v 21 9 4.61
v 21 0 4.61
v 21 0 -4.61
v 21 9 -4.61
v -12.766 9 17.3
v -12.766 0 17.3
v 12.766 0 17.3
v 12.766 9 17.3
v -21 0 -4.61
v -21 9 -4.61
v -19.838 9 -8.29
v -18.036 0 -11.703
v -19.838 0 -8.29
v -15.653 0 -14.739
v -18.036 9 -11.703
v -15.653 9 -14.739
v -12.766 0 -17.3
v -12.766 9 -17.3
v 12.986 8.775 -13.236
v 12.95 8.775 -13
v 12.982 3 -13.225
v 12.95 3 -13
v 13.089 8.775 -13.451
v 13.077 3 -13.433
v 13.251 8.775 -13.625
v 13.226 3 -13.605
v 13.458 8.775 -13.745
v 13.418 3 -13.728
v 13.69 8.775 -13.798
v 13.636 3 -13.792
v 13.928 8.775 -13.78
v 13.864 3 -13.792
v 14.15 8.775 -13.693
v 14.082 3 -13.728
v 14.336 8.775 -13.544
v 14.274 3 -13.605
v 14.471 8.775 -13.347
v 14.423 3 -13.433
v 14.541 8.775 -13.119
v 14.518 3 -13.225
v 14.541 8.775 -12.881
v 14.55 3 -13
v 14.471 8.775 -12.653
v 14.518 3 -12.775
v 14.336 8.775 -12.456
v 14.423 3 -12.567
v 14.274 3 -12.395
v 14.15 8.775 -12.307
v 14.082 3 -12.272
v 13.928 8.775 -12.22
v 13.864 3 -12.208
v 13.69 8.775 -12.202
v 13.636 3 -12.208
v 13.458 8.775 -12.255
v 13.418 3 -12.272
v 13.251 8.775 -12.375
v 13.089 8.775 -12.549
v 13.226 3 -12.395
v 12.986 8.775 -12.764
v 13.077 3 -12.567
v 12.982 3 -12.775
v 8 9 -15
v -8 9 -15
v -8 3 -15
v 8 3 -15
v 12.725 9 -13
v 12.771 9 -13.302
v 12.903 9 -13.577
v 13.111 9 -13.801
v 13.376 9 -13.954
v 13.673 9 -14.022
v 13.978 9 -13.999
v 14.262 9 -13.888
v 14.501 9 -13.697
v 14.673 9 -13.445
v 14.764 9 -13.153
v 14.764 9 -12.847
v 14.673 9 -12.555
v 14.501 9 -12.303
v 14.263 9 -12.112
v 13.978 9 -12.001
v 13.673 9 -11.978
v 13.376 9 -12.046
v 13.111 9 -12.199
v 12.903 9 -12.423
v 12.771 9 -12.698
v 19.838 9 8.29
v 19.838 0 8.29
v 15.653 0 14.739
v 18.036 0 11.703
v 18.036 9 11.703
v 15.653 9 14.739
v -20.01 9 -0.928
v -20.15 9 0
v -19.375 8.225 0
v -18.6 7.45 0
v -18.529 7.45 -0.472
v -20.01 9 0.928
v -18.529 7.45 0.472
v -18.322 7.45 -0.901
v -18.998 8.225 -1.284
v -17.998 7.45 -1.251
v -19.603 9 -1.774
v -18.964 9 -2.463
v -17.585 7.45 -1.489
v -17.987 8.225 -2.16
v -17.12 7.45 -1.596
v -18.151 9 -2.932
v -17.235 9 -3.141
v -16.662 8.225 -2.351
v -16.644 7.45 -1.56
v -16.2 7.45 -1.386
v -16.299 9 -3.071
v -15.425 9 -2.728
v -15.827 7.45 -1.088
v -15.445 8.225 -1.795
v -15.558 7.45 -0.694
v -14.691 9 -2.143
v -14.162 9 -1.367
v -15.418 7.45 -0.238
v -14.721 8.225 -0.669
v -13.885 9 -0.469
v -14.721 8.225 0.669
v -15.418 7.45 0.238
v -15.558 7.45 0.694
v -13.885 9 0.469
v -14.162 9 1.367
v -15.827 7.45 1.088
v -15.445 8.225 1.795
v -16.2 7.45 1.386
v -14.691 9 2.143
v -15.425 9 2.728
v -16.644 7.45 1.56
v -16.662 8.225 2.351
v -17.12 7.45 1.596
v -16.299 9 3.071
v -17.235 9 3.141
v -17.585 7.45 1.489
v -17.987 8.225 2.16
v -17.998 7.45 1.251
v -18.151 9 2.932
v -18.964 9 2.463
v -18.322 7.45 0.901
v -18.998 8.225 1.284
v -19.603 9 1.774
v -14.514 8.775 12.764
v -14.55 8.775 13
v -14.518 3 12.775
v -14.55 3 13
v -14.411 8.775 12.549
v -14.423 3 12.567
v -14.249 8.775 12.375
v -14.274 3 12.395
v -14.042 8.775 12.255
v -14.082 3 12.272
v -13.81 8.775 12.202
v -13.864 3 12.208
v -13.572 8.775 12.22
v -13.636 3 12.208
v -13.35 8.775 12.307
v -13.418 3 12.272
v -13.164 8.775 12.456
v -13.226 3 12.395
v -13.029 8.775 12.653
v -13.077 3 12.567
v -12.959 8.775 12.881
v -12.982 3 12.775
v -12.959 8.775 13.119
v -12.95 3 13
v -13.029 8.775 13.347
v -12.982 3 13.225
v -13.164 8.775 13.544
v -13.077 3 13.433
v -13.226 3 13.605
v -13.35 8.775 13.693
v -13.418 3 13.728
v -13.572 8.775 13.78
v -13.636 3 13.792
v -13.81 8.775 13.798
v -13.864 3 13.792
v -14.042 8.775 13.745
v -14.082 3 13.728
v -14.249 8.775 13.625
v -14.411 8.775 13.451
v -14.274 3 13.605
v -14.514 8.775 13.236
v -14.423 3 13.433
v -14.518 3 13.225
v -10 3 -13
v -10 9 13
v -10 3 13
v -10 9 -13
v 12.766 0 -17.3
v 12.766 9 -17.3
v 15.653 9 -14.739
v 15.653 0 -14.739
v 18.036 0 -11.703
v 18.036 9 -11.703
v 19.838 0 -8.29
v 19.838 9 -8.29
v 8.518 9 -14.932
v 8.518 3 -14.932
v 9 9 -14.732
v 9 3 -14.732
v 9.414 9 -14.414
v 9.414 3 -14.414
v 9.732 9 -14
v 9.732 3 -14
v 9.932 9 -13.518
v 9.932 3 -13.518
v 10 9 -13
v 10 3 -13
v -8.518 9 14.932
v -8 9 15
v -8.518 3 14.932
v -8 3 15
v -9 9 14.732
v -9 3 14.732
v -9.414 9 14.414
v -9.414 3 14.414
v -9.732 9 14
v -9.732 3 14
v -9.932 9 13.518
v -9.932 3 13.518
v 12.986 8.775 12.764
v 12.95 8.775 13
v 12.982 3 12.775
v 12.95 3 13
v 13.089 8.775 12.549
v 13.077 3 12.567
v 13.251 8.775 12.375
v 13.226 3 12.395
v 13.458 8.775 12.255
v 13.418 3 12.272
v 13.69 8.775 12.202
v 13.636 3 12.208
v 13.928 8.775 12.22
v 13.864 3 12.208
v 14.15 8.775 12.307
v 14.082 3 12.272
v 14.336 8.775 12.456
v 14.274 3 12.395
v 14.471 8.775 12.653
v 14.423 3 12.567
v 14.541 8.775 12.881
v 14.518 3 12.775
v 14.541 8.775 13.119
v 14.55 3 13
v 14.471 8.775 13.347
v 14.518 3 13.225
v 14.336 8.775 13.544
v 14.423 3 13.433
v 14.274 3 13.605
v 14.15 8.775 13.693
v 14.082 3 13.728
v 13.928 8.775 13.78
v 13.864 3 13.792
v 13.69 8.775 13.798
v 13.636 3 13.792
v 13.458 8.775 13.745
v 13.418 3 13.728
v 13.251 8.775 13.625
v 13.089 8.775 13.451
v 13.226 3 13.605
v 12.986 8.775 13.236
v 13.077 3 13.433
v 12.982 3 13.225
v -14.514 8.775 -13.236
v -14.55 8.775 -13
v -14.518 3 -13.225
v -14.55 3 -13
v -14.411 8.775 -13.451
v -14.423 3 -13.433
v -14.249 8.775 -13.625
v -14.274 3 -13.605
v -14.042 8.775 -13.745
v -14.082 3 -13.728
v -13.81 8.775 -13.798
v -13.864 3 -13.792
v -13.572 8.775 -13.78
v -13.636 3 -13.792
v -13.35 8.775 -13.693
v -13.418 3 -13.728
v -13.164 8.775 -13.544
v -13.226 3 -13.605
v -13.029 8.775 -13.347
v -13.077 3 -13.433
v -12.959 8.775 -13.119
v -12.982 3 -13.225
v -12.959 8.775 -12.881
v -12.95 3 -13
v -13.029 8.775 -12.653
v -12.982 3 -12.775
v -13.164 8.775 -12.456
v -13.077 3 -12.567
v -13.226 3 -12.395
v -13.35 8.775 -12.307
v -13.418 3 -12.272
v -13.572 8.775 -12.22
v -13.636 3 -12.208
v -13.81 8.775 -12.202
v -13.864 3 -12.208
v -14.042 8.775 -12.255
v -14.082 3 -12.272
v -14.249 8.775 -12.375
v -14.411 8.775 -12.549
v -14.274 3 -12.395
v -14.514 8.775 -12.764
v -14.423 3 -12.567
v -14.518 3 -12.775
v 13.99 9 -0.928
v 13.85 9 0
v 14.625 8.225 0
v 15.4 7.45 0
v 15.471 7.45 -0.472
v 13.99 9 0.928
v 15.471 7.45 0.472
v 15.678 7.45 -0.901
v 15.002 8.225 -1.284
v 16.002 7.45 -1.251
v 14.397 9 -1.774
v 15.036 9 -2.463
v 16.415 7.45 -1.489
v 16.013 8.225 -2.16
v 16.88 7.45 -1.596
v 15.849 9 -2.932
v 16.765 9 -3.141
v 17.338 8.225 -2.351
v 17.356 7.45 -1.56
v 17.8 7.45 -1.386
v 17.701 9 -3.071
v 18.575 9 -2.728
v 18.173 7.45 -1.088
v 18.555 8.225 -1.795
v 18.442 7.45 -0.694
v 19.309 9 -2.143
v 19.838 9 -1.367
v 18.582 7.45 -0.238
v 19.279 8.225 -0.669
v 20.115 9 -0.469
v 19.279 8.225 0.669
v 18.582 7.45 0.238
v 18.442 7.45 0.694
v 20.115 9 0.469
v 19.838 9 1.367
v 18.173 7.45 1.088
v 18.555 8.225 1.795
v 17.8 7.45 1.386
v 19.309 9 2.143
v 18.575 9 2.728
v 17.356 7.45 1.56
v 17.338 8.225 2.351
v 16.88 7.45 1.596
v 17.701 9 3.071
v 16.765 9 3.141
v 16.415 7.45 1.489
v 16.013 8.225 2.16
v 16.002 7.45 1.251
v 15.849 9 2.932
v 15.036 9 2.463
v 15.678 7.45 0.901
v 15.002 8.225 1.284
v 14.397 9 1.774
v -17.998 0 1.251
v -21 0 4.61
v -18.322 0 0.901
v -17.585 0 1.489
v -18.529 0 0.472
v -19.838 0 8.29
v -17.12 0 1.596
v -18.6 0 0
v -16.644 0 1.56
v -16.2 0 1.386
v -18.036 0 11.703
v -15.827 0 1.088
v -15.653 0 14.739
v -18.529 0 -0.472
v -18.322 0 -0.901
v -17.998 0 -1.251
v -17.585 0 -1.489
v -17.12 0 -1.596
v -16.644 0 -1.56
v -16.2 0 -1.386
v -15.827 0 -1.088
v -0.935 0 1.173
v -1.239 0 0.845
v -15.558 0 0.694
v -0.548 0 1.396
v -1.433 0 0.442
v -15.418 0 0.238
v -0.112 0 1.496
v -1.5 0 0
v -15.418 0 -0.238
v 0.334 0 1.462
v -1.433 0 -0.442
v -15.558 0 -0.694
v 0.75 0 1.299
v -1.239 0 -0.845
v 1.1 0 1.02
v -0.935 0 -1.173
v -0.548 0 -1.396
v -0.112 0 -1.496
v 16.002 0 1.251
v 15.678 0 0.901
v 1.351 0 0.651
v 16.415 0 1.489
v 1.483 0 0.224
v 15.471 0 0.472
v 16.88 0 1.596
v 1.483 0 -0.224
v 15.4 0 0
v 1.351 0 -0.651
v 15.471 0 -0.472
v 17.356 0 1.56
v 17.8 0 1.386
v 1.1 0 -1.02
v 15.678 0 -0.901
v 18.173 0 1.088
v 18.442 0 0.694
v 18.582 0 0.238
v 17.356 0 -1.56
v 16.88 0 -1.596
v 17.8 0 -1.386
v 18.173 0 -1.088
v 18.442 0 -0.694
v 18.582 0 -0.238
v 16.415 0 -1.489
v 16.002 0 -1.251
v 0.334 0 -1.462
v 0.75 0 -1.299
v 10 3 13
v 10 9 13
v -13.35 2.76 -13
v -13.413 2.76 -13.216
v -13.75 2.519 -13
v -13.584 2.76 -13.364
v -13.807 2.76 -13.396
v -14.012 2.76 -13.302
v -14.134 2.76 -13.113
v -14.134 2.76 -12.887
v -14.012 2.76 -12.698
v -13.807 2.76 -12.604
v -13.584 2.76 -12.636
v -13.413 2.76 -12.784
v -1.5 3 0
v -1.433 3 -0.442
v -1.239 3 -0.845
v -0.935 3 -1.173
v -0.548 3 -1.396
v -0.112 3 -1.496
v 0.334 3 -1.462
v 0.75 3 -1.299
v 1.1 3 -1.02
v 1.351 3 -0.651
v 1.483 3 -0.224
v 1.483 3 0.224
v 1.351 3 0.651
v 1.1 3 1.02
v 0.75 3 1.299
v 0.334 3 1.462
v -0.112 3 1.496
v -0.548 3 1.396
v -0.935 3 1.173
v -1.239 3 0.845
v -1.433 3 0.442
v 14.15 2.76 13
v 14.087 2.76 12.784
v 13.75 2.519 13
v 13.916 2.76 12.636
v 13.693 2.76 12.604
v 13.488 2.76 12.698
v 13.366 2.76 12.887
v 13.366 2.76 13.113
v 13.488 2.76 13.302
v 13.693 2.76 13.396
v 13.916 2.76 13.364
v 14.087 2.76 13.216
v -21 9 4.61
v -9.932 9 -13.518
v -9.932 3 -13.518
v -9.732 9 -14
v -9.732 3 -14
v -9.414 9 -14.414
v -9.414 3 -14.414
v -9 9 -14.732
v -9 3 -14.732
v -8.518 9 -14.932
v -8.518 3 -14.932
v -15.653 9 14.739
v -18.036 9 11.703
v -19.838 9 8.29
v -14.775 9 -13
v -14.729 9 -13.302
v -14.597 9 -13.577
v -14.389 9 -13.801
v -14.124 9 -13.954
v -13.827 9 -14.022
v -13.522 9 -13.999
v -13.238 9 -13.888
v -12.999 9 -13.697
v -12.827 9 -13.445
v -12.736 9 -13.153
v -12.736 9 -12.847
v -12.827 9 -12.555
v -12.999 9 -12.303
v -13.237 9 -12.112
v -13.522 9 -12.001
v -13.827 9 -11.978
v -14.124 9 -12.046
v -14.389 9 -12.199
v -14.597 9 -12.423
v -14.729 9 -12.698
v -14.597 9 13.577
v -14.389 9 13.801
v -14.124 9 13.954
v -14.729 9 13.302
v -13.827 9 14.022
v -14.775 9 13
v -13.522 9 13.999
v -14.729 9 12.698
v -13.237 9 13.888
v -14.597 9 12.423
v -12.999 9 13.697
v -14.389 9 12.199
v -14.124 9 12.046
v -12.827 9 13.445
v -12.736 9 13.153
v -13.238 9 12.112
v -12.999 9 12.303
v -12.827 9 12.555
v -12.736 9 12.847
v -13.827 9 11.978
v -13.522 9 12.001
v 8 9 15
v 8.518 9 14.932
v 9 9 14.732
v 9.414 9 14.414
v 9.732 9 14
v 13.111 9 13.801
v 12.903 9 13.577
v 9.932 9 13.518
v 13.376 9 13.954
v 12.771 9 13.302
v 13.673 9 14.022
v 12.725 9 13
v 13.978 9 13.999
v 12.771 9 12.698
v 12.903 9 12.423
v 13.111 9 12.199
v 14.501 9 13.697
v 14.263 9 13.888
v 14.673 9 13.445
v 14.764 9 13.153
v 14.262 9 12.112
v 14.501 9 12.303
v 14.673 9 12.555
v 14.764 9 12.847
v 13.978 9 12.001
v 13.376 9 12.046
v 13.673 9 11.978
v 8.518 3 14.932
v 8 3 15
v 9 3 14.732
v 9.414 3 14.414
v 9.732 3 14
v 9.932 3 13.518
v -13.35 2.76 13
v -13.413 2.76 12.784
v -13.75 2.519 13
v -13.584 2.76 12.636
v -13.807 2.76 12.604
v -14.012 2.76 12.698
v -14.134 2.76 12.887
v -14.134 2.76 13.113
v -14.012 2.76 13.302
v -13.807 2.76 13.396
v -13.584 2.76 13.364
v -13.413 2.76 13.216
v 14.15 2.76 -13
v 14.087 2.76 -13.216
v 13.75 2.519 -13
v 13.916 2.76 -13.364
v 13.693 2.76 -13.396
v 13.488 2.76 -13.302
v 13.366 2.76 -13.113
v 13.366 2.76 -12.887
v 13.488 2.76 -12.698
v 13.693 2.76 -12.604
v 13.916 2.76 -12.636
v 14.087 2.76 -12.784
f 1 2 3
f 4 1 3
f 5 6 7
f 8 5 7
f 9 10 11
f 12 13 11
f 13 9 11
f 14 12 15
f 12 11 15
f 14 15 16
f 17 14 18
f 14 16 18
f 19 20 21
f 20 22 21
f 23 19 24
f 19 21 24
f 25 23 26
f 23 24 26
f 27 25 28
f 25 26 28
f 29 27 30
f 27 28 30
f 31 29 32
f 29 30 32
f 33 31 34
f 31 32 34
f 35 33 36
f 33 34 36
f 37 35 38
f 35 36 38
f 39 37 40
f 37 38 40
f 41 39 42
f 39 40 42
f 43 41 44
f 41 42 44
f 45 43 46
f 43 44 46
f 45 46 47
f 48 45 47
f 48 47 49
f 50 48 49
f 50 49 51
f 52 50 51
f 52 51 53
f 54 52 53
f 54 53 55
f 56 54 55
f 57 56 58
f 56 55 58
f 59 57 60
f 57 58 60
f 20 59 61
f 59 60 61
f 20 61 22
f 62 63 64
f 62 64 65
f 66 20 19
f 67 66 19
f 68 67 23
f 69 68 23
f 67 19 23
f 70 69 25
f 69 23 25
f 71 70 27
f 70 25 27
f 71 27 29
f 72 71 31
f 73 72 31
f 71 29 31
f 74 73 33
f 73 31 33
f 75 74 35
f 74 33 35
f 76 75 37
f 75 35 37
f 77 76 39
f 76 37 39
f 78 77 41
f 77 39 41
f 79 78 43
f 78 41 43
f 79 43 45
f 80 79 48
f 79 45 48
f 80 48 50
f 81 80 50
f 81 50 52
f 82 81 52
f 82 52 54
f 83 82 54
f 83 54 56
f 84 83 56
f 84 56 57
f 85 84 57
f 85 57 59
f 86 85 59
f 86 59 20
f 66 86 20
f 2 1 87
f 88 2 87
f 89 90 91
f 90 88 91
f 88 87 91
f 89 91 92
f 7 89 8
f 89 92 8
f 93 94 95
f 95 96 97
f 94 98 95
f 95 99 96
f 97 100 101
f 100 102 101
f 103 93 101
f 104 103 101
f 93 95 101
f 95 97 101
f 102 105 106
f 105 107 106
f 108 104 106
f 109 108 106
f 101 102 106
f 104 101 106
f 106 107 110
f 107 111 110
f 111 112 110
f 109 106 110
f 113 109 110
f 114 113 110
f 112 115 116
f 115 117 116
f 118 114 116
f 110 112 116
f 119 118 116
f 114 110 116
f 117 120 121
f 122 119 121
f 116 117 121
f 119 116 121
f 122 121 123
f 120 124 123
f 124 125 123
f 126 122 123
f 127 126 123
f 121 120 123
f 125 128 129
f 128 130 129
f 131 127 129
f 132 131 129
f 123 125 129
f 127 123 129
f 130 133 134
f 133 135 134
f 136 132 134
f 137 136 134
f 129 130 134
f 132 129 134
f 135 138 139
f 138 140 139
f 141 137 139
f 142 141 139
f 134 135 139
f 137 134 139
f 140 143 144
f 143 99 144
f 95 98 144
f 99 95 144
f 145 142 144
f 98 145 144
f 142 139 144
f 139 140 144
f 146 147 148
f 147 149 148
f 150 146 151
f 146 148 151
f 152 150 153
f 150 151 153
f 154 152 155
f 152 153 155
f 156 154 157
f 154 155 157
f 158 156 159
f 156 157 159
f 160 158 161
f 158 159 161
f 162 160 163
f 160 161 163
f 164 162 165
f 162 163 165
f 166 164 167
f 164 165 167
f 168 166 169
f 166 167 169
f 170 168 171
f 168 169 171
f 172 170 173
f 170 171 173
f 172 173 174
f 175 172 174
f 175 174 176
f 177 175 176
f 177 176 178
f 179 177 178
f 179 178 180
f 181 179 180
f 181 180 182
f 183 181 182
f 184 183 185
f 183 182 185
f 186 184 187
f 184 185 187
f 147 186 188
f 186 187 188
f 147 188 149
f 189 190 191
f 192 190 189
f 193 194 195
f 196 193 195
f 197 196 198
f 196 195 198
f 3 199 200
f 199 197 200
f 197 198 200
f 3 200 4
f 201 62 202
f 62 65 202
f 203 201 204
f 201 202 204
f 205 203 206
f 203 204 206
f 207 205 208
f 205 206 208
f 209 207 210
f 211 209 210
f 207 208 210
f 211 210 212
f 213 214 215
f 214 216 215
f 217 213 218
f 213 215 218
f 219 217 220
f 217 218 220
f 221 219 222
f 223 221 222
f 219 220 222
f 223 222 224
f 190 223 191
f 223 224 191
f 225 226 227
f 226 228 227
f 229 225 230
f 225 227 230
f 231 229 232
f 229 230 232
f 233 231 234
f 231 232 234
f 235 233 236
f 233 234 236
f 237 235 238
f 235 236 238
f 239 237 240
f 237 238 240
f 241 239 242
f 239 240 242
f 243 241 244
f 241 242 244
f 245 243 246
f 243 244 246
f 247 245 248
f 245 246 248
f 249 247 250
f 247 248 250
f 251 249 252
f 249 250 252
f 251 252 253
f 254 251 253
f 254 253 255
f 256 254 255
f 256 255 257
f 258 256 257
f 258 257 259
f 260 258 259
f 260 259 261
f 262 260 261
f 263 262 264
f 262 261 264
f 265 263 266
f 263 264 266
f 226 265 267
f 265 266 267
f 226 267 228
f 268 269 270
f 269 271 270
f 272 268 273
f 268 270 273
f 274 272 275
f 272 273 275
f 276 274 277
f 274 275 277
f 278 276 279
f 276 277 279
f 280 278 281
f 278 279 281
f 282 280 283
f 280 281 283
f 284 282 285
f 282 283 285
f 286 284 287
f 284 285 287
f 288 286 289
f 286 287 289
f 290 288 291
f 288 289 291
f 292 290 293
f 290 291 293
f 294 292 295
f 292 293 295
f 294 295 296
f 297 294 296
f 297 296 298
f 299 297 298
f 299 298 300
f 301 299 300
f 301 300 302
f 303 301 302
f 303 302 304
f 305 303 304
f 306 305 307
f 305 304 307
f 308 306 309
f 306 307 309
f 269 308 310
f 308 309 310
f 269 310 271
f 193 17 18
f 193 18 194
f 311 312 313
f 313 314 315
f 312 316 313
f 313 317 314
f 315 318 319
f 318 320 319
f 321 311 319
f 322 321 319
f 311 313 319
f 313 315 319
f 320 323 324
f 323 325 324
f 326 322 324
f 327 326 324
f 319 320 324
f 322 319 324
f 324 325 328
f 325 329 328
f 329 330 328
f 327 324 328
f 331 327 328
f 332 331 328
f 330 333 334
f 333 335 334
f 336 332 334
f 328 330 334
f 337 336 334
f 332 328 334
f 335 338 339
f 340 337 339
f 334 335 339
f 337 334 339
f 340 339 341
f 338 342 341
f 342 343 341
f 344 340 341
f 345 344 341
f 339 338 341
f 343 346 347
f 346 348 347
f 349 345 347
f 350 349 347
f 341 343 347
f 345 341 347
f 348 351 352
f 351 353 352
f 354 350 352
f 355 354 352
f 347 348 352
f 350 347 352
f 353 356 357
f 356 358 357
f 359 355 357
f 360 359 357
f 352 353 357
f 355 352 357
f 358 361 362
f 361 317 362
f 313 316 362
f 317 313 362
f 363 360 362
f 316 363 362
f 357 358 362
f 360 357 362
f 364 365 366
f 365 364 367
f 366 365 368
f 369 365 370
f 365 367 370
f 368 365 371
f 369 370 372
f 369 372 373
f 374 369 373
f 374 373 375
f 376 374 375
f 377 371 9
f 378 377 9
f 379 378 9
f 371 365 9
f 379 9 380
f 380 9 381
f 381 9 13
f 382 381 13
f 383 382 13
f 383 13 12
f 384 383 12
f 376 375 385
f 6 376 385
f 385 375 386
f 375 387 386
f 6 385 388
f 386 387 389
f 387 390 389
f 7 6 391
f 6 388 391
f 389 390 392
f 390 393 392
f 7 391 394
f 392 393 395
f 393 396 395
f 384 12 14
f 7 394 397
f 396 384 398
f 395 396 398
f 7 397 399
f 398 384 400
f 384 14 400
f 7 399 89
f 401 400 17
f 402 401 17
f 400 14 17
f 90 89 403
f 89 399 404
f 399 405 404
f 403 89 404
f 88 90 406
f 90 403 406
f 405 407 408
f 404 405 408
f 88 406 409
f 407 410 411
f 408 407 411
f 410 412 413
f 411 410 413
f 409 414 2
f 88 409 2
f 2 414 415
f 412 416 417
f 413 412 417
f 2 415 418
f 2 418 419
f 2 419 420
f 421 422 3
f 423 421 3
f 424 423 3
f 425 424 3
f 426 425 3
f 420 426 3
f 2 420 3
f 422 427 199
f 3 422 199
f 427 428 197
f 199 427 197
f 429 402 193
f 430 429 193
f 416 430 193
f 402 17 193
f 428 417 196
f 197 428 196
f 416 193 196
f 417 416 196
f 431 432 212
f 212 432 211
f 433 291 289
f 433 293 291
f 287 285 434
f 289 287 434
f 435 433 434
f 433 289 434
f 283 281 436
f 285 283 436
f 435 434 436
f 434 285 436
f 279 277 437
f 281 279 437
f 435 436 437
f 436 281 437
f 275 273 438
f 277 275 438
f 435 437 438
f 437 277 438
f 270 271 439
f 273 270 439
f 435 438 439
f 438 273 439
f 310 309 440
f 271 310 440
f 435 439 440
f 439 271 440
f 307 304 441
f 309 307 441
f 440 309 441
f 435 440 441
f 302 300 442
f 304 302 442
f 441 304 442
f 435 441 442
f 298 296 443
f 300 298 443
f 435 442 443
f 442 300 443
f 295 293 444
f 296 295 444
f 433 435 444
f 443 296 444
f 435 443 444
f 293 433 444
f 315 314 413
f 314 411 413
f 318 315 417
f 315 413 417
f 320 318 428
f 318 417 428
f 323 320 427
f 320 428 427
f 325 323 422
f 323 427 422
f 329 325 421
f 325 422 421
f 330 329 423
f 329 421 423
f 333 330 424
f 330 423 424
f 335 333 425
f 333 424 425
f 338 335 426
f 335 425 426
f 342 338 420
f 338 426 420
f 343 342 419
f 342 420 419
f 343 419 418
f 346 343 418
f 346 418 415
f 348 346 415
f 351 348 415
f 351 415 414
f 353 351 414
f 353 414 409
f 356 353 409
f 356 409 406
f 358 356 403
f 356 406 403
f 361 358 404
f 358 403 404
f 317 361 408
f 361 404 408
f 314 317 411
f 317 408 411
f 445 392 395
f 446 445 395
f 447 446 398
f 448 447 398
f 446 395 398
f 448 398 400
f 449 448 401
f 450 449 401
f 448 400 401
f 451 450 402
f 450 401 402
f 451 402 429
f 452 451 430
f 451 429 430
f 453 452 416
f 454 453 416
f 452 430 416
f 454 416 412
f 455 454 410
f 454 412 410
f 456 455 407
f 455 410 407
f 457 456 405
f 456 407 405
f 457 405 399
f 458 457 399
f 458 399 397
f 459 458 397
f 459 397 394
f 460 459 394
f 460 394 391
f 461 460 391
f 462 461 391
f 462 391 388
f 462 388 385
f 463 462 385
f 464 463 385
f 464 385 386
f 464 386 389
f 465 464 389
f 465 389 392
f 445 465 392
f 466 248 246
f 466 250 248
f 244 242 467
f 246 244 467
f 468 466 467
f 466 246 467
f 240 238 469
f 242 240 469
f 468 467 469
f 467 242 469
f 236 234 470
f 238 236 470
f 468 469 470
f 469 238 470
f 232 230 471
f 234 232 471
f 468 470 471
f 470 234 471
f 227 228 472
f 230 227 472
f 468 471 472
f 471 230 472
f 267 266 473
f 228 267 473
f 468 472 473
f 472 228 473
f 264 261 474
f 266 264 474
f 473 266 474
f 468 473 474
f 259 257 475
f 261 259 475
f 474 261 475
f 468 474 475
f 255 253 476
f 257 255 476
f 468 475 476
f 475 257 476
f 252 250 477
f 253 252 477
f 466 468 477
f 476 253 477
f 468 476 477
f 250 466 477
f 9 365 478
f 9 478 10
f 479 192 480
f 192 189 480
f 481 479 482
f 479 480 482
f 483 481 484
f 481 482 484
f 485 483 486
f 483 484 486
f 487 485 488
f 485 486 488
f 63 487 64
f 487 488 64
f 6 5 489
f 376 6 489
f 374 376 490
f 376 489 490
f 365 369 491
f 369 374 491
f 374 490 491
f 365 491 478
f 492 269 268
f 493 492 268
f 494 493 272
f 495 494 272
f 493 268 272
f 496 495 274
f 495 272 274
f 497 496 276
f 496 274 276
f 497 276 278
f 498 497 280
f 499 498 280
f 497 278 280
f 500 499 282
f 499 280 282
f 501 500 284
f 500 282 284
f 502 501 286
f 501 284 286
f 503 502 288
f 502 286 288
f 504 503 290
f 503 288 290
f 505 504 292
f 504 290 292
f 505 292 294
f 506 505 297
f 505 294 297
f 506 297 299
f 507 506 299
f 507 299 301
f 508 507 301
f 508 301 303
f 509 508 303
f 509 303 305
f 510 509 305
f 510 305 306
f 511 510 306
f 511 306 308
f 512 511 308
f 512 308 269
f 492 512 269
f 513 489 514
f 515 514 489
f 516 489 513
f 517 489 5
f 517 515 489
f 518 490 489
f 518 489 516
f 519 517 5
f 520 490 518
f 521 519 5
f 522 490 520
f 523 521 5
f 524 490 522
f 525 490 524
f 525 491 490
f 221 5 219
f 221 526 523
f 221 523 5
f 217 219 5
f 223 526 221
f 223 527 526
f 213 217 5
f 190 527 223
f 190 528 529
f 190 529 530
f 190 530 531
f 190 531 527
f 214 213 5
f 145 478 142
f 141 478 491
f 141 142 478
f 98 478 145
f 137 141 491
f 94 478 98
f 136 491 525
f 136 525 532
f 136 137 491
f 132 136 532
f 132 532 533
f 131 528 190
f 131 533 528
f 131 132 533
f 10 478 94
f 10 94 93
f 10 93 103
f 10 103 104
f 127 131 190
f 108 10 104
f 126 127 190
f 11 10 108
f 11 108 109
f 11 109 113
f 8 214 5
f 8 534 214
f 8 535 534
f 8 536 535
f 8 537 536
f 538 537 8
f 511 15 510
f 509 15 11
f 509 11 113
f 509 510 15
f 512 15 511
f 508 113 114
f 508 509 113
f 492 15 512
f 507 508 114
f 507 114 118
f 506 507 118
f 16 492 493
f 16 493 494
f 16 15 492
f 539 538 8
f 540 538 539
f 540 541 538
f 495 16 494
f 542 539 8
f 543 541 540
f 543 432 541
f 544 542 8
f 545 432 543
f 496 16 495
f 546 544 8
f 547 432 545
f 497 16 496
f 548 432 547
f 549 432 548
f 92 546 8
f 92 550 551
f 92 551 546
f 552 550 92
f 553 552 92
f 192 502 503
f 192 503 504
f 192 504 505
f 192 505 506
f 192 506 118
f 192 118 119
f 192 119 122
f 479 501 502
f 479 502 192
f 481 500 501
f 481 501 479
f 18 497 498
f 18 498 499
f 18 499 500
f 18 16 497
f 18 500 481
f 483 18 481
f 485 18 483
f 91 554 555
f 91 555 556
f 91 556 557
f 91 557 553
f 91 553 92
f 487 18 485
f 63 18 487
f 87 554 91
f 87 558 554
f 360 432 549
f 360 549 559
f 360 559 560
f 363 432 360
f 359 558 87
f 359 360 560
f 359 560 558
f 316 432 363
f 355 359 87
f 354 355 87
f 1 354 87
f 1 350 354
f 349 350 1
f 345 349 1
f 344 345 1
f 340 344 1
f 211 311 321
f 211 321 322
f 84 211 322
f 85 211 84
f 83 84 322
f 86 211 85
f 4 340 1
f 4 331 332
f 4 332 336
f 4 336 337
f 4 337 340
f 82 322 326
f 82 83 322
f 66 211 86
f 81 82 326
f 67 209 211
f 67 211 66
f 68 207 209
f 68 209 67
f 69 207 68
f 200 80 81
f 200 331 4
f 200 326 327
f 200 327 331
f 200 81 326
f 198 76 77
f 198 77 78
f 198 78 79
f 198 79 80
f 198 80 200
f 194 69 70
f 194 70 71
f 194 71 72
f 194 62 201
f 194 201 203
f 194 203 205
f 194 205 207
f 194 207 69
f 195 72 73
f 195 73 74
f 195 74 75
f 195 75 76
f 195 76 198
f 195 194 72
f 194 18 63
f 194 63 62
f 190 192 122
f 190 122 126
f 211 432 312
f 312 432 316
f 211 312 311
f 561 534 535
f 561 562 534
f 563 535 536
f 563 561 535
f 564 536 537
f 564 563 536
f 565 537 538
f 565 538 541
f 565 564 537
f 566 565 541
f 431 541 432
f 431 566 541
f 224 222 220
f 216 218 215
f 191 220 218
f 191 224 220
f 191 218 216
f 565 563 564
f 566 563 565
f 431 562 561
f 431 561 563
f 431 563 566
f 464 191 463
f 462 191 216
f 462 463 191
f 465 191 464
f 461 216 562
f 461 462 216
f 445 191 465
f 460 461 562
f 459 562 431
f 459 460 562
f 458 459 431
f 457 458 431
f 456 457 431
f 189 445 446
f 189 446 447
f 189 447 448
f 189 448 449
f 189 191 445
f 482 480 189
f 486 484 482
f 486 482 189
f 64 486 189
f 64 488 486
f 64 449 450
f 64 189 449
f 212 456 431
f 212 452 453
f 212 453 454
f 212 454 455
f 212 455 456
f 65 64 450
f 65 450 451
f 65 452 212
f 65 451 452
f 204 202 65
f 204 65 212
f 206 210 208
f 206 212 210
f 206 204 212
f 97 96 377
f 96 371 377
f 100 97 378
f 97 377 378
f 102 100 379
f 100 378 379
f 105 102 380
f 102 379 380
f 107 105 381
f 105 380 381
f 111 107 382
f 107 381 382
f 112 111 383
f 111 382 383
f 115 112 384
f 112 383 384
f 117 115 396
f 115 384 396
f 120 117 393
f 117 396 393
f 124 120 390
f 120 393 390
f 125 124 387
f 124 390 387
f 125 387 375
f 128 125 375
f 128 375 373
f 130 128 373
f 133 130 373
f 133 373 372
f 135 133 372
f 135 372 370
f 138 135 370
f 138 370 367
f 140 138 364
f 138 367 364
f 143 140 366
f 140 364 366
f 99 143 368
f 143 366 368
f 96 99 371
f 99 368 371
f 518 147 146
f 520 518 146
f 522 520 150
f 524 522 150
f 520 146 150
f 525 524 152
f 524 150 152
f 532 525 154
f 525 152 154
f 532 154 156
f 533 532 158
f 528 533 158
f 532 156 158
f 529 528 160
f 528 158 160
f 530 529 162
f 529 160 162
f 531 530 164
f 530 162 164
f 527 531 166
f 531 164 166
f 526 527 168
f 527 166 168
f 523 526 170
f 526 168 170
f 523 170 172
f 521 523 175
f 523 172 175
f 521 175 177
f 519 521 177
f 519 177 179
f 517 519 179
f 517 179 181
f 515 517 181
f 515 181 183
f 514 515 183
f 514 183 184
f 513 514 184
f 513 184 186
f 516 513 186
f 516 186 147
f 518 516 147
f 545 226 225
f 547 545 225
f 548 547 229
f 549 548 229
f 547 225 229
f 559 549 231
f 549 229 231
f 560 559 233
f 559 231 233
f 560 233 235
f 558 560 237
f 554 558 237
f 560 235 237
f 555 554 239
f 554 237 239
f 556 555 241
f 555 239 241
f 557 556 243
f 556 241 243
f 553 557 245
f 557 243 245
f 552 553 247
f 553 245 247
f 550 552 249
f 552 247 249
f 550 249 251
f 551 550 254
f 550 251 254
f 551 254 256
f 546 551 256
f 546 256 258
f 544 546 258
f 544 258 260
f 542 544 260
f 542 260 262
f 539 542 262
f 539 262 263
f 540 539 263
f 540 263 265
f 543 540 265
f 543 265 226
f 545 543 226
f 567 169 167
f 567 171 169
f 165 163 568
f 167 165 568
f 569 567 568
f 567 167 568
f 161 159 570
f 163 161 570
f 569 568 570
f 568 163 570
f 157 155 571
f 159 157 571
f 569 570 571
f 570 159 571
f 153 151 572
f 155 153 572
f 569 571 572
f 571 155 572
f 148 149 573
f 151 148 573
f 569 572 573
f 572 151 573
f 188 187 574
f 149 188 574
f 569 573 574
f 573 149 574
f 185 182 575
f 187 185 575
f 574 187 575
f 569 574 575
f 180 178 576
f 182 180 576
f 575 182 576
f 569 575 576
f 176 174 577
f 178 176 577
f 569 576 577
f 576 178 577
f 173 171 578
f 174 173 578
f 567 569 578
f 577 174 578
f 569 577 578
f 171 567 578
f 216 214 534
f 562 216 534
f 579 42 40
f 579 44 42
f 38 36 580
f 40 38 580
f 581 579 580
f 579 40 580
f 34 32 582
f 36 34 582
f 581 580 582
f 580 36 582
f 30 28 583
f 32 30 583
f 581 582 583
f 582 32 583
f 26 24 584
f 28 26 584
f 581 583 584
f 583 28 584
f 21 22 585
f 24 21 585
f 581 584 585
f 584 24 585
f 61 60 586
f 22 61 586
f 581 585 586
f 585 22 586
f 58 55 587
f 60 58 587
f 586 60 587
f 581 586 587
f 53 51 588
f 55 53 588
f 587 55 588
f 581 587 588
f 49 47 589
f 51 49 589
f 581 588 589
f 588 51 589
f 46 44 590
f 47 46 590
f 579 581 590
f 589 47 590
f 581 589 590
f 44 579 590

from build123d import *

# Parameters (mm, degrees)
SKIZZE1_W                                            = 42
SKIZZE1_H                                            = 34.6
AUFSATZ_LINEAR_AUSTRAGEN1_DEPTH                      = 9
FORMSENKUNG_F_R_M3_SENKSCHRAUBE_MIT_SCHL_D           = 3.2
FORMSENKUNG_F_R_M3_SENKSCHRAUBE_MIT_SCHL_DEPTH       = 12.4
FORMSENKUNG_F_R_M3_SENKSCHRAUBE_MIT_SCHL_CSINK_D     = 6.3
FORMSENKUNG_F_R_M3_SENKSCHRAUBE_MIT_SCHL_CSINK_ANGLE = 90
FORMSENKUNG_F_R_M3_SENKSCHRAUBE_MIT_SCHL_TIP         = 0.96137699
SKIZZE17_W                                           = 20
SKIZZE17_H                                           = 30
SCHNITT_LINEAR_AUSTRAGEN2_DEPTH                      = 6
M2_GEWINDEBOHRUNG3_D                                 = 1.6
M2_GEWINDEBOHRUNG3_DEPTH                             = 6
M2_GEWINDEBOHRUNG3_CSINK_D                           = 2.05
M2_GEWINDEBOHRUNG3_CSINK_ANGLE                       = 90
M2_GEWINDEBOHRUNG3_TIP                               = 0.480688495
VERRUNDUNG2_R                                        = 2
F_3_0_3_DURCHMESSER_BOHRUNG3_D                       = 3
SCHNITT_LINEAR_AUSTRAGEN_D_NN1_DEPTH                 = 10
SCHNITT_LINEAR_AUSTRAGEN_D_NN1_DEPTH_BACK            = 10
SKIZZE24_R                                           = 31.5
SKIZZE24_R_2                                         = 21.5


with BuildPart() as part:
    # Skizze1 → Aufsatz-Linear austragen1 (new body)
    with BuildSketch(Plane(origin=(0, 0, 0), x_dir=(1, 0, 0), z_dir=(0, 1, 0))):
        Rectangle(SKIZZE1_W, SKIZZE1_H)
    extrude(amount=AUFSATZ_LINEAR_AUSTRAGEN1_DEPTH)

    # Formsenkung für M3 Senkschraube mit Schlitz/Kreuzschlitz1
    with Locations(Plane(origin=(0, 9, 0), x_dir=(1, 0, 0), z_dir=(0, 1, 0))):
        with Locations((-17, 0), (17, 0)):
            CounterSinkHole(FORMSENKUNG_F_R_M3_SENKSCHRAUBE_MIT_SCHL_D / 2, FORMSENKUNG_F_R_M3_SENKSCHRAUBE_MIT_SCHL_CSINK_D / 2, depth=FORMSENKUNG_F_R_M3_SENKSCHRAUBE_MIT_SCHL_DEPTH, counter_sink_angle=FORMSENKUNG_F_R_M3_SENKSCHRAUBE_MIT_SCHL_CSINK_ANGLE)
            with Locations((0, 0, -(FORMSENKUNG_F_R_M3_SENKSCHRAUBE_MIT_SCHL_DEPTH + FORMSENKUNG_F_R_M3_SENKSCHRAUBE_MIT_SCHL_TIP / 2))):  # 118° drill point
                Cone(0, FORMSENKUNG_F_R_M3_SENKSCHRAUBE_MIT_SCHL_D / 2, FORMSENKUNG_F_R_M3_SENKSCHRAUBE_MIT_SCHL_TIP, mode=Mode.SUBTRACT)

    # Skizze17 → Schnitt-Linear austragen2 (cut)
    with BuildSketch(Plane(origin=(0, 9, 0), x_dir=(1, 0, 0), z_dir=(0, 1, 0))):
        Rectangle(SKIZZE17_W, SKIZZE17_H)
    extrude(amount=-SCHNITT_LINEAR_AUSTRAGEN2_DEPTH, mode=Mode.SUBTRACT)

    # M2 Gewindebohrung3
    with Locations(Plane(origin=(0, 9, 0), x_dir=(1, 0, 0), z_dir=(0, 1, 0))):
        with Locations((-13.75, 13), (13.75, 13), (13.75, -13), (-13.75, -13)):
            CounterSinkHole(M2_GEWINDEBOHRUNG3_D / 2, M2_GEWINDEBOHRUNG3_CSINK_D / 2, depth=M2_GEWINDEBOHRUNG3_DEPTH, counter_sink_angle=M2_GEWINDEBOHRUNG3_CSINK_ANGLE)
            with Locations((0, 0, -(M2_GEWINDEBOHRUNG3_DEPTH + M2_GEWINDEBOHRUNG3_TIP / 2))):  # 118° drill point
                Cone(0, M2_GEWINDEBOHRUNG3_D / 2, M2_GEWINDEBOHRUNG3_TIP, mode=Mode.SUBTRACT)

    # Verrundung2
    verrundung2_edges = [part.edges().sort_by_distance(p)[0] for p in [
        (-10, 6, 15),
        (-10, 6, -15),
        (10, 6, -15),
        (10, 6, 15),
    ]]
    fillet(verrundung2_edges, radius=VERRUNDUNG2_R)

    # Ø3.0 (3) Durchmesser Bohrung3 (through all)
    with Locations(Plane(origin=(0, 3, 0), x_dir=(1, 0, 0), z_dir=(0, 1, 0))):
        with Locations((0, 0)):
            Hole(F_3_0_3_DURCHMESSER_BOHRUNG3_D / 2)

    # Skizze24 → Schnitt-Linear-Austragen-Dünn1 (cut, two sides: drawn at the far end of the back side and taken through both)
    with BuildSketch(Plane.XZ.offset(-SCHNITT_LINEAR_AUSTRAGEN_D_NN1_DEPTH_BACK)):
        Circle(SKIZZE24_R)
        Circle(SKIZZE24_R_2, mode=Mode.SUBTRACT)
    extrude(amount=SCHNITT_LINEAR_AUSTRAGEN_D_NN1_DEPTH + SCHNITT_LINEAR_AUSTRAGEN_D_NN1_DEPTH_BACK, mode=Mode.SUBTRACT)


solid = part.part
